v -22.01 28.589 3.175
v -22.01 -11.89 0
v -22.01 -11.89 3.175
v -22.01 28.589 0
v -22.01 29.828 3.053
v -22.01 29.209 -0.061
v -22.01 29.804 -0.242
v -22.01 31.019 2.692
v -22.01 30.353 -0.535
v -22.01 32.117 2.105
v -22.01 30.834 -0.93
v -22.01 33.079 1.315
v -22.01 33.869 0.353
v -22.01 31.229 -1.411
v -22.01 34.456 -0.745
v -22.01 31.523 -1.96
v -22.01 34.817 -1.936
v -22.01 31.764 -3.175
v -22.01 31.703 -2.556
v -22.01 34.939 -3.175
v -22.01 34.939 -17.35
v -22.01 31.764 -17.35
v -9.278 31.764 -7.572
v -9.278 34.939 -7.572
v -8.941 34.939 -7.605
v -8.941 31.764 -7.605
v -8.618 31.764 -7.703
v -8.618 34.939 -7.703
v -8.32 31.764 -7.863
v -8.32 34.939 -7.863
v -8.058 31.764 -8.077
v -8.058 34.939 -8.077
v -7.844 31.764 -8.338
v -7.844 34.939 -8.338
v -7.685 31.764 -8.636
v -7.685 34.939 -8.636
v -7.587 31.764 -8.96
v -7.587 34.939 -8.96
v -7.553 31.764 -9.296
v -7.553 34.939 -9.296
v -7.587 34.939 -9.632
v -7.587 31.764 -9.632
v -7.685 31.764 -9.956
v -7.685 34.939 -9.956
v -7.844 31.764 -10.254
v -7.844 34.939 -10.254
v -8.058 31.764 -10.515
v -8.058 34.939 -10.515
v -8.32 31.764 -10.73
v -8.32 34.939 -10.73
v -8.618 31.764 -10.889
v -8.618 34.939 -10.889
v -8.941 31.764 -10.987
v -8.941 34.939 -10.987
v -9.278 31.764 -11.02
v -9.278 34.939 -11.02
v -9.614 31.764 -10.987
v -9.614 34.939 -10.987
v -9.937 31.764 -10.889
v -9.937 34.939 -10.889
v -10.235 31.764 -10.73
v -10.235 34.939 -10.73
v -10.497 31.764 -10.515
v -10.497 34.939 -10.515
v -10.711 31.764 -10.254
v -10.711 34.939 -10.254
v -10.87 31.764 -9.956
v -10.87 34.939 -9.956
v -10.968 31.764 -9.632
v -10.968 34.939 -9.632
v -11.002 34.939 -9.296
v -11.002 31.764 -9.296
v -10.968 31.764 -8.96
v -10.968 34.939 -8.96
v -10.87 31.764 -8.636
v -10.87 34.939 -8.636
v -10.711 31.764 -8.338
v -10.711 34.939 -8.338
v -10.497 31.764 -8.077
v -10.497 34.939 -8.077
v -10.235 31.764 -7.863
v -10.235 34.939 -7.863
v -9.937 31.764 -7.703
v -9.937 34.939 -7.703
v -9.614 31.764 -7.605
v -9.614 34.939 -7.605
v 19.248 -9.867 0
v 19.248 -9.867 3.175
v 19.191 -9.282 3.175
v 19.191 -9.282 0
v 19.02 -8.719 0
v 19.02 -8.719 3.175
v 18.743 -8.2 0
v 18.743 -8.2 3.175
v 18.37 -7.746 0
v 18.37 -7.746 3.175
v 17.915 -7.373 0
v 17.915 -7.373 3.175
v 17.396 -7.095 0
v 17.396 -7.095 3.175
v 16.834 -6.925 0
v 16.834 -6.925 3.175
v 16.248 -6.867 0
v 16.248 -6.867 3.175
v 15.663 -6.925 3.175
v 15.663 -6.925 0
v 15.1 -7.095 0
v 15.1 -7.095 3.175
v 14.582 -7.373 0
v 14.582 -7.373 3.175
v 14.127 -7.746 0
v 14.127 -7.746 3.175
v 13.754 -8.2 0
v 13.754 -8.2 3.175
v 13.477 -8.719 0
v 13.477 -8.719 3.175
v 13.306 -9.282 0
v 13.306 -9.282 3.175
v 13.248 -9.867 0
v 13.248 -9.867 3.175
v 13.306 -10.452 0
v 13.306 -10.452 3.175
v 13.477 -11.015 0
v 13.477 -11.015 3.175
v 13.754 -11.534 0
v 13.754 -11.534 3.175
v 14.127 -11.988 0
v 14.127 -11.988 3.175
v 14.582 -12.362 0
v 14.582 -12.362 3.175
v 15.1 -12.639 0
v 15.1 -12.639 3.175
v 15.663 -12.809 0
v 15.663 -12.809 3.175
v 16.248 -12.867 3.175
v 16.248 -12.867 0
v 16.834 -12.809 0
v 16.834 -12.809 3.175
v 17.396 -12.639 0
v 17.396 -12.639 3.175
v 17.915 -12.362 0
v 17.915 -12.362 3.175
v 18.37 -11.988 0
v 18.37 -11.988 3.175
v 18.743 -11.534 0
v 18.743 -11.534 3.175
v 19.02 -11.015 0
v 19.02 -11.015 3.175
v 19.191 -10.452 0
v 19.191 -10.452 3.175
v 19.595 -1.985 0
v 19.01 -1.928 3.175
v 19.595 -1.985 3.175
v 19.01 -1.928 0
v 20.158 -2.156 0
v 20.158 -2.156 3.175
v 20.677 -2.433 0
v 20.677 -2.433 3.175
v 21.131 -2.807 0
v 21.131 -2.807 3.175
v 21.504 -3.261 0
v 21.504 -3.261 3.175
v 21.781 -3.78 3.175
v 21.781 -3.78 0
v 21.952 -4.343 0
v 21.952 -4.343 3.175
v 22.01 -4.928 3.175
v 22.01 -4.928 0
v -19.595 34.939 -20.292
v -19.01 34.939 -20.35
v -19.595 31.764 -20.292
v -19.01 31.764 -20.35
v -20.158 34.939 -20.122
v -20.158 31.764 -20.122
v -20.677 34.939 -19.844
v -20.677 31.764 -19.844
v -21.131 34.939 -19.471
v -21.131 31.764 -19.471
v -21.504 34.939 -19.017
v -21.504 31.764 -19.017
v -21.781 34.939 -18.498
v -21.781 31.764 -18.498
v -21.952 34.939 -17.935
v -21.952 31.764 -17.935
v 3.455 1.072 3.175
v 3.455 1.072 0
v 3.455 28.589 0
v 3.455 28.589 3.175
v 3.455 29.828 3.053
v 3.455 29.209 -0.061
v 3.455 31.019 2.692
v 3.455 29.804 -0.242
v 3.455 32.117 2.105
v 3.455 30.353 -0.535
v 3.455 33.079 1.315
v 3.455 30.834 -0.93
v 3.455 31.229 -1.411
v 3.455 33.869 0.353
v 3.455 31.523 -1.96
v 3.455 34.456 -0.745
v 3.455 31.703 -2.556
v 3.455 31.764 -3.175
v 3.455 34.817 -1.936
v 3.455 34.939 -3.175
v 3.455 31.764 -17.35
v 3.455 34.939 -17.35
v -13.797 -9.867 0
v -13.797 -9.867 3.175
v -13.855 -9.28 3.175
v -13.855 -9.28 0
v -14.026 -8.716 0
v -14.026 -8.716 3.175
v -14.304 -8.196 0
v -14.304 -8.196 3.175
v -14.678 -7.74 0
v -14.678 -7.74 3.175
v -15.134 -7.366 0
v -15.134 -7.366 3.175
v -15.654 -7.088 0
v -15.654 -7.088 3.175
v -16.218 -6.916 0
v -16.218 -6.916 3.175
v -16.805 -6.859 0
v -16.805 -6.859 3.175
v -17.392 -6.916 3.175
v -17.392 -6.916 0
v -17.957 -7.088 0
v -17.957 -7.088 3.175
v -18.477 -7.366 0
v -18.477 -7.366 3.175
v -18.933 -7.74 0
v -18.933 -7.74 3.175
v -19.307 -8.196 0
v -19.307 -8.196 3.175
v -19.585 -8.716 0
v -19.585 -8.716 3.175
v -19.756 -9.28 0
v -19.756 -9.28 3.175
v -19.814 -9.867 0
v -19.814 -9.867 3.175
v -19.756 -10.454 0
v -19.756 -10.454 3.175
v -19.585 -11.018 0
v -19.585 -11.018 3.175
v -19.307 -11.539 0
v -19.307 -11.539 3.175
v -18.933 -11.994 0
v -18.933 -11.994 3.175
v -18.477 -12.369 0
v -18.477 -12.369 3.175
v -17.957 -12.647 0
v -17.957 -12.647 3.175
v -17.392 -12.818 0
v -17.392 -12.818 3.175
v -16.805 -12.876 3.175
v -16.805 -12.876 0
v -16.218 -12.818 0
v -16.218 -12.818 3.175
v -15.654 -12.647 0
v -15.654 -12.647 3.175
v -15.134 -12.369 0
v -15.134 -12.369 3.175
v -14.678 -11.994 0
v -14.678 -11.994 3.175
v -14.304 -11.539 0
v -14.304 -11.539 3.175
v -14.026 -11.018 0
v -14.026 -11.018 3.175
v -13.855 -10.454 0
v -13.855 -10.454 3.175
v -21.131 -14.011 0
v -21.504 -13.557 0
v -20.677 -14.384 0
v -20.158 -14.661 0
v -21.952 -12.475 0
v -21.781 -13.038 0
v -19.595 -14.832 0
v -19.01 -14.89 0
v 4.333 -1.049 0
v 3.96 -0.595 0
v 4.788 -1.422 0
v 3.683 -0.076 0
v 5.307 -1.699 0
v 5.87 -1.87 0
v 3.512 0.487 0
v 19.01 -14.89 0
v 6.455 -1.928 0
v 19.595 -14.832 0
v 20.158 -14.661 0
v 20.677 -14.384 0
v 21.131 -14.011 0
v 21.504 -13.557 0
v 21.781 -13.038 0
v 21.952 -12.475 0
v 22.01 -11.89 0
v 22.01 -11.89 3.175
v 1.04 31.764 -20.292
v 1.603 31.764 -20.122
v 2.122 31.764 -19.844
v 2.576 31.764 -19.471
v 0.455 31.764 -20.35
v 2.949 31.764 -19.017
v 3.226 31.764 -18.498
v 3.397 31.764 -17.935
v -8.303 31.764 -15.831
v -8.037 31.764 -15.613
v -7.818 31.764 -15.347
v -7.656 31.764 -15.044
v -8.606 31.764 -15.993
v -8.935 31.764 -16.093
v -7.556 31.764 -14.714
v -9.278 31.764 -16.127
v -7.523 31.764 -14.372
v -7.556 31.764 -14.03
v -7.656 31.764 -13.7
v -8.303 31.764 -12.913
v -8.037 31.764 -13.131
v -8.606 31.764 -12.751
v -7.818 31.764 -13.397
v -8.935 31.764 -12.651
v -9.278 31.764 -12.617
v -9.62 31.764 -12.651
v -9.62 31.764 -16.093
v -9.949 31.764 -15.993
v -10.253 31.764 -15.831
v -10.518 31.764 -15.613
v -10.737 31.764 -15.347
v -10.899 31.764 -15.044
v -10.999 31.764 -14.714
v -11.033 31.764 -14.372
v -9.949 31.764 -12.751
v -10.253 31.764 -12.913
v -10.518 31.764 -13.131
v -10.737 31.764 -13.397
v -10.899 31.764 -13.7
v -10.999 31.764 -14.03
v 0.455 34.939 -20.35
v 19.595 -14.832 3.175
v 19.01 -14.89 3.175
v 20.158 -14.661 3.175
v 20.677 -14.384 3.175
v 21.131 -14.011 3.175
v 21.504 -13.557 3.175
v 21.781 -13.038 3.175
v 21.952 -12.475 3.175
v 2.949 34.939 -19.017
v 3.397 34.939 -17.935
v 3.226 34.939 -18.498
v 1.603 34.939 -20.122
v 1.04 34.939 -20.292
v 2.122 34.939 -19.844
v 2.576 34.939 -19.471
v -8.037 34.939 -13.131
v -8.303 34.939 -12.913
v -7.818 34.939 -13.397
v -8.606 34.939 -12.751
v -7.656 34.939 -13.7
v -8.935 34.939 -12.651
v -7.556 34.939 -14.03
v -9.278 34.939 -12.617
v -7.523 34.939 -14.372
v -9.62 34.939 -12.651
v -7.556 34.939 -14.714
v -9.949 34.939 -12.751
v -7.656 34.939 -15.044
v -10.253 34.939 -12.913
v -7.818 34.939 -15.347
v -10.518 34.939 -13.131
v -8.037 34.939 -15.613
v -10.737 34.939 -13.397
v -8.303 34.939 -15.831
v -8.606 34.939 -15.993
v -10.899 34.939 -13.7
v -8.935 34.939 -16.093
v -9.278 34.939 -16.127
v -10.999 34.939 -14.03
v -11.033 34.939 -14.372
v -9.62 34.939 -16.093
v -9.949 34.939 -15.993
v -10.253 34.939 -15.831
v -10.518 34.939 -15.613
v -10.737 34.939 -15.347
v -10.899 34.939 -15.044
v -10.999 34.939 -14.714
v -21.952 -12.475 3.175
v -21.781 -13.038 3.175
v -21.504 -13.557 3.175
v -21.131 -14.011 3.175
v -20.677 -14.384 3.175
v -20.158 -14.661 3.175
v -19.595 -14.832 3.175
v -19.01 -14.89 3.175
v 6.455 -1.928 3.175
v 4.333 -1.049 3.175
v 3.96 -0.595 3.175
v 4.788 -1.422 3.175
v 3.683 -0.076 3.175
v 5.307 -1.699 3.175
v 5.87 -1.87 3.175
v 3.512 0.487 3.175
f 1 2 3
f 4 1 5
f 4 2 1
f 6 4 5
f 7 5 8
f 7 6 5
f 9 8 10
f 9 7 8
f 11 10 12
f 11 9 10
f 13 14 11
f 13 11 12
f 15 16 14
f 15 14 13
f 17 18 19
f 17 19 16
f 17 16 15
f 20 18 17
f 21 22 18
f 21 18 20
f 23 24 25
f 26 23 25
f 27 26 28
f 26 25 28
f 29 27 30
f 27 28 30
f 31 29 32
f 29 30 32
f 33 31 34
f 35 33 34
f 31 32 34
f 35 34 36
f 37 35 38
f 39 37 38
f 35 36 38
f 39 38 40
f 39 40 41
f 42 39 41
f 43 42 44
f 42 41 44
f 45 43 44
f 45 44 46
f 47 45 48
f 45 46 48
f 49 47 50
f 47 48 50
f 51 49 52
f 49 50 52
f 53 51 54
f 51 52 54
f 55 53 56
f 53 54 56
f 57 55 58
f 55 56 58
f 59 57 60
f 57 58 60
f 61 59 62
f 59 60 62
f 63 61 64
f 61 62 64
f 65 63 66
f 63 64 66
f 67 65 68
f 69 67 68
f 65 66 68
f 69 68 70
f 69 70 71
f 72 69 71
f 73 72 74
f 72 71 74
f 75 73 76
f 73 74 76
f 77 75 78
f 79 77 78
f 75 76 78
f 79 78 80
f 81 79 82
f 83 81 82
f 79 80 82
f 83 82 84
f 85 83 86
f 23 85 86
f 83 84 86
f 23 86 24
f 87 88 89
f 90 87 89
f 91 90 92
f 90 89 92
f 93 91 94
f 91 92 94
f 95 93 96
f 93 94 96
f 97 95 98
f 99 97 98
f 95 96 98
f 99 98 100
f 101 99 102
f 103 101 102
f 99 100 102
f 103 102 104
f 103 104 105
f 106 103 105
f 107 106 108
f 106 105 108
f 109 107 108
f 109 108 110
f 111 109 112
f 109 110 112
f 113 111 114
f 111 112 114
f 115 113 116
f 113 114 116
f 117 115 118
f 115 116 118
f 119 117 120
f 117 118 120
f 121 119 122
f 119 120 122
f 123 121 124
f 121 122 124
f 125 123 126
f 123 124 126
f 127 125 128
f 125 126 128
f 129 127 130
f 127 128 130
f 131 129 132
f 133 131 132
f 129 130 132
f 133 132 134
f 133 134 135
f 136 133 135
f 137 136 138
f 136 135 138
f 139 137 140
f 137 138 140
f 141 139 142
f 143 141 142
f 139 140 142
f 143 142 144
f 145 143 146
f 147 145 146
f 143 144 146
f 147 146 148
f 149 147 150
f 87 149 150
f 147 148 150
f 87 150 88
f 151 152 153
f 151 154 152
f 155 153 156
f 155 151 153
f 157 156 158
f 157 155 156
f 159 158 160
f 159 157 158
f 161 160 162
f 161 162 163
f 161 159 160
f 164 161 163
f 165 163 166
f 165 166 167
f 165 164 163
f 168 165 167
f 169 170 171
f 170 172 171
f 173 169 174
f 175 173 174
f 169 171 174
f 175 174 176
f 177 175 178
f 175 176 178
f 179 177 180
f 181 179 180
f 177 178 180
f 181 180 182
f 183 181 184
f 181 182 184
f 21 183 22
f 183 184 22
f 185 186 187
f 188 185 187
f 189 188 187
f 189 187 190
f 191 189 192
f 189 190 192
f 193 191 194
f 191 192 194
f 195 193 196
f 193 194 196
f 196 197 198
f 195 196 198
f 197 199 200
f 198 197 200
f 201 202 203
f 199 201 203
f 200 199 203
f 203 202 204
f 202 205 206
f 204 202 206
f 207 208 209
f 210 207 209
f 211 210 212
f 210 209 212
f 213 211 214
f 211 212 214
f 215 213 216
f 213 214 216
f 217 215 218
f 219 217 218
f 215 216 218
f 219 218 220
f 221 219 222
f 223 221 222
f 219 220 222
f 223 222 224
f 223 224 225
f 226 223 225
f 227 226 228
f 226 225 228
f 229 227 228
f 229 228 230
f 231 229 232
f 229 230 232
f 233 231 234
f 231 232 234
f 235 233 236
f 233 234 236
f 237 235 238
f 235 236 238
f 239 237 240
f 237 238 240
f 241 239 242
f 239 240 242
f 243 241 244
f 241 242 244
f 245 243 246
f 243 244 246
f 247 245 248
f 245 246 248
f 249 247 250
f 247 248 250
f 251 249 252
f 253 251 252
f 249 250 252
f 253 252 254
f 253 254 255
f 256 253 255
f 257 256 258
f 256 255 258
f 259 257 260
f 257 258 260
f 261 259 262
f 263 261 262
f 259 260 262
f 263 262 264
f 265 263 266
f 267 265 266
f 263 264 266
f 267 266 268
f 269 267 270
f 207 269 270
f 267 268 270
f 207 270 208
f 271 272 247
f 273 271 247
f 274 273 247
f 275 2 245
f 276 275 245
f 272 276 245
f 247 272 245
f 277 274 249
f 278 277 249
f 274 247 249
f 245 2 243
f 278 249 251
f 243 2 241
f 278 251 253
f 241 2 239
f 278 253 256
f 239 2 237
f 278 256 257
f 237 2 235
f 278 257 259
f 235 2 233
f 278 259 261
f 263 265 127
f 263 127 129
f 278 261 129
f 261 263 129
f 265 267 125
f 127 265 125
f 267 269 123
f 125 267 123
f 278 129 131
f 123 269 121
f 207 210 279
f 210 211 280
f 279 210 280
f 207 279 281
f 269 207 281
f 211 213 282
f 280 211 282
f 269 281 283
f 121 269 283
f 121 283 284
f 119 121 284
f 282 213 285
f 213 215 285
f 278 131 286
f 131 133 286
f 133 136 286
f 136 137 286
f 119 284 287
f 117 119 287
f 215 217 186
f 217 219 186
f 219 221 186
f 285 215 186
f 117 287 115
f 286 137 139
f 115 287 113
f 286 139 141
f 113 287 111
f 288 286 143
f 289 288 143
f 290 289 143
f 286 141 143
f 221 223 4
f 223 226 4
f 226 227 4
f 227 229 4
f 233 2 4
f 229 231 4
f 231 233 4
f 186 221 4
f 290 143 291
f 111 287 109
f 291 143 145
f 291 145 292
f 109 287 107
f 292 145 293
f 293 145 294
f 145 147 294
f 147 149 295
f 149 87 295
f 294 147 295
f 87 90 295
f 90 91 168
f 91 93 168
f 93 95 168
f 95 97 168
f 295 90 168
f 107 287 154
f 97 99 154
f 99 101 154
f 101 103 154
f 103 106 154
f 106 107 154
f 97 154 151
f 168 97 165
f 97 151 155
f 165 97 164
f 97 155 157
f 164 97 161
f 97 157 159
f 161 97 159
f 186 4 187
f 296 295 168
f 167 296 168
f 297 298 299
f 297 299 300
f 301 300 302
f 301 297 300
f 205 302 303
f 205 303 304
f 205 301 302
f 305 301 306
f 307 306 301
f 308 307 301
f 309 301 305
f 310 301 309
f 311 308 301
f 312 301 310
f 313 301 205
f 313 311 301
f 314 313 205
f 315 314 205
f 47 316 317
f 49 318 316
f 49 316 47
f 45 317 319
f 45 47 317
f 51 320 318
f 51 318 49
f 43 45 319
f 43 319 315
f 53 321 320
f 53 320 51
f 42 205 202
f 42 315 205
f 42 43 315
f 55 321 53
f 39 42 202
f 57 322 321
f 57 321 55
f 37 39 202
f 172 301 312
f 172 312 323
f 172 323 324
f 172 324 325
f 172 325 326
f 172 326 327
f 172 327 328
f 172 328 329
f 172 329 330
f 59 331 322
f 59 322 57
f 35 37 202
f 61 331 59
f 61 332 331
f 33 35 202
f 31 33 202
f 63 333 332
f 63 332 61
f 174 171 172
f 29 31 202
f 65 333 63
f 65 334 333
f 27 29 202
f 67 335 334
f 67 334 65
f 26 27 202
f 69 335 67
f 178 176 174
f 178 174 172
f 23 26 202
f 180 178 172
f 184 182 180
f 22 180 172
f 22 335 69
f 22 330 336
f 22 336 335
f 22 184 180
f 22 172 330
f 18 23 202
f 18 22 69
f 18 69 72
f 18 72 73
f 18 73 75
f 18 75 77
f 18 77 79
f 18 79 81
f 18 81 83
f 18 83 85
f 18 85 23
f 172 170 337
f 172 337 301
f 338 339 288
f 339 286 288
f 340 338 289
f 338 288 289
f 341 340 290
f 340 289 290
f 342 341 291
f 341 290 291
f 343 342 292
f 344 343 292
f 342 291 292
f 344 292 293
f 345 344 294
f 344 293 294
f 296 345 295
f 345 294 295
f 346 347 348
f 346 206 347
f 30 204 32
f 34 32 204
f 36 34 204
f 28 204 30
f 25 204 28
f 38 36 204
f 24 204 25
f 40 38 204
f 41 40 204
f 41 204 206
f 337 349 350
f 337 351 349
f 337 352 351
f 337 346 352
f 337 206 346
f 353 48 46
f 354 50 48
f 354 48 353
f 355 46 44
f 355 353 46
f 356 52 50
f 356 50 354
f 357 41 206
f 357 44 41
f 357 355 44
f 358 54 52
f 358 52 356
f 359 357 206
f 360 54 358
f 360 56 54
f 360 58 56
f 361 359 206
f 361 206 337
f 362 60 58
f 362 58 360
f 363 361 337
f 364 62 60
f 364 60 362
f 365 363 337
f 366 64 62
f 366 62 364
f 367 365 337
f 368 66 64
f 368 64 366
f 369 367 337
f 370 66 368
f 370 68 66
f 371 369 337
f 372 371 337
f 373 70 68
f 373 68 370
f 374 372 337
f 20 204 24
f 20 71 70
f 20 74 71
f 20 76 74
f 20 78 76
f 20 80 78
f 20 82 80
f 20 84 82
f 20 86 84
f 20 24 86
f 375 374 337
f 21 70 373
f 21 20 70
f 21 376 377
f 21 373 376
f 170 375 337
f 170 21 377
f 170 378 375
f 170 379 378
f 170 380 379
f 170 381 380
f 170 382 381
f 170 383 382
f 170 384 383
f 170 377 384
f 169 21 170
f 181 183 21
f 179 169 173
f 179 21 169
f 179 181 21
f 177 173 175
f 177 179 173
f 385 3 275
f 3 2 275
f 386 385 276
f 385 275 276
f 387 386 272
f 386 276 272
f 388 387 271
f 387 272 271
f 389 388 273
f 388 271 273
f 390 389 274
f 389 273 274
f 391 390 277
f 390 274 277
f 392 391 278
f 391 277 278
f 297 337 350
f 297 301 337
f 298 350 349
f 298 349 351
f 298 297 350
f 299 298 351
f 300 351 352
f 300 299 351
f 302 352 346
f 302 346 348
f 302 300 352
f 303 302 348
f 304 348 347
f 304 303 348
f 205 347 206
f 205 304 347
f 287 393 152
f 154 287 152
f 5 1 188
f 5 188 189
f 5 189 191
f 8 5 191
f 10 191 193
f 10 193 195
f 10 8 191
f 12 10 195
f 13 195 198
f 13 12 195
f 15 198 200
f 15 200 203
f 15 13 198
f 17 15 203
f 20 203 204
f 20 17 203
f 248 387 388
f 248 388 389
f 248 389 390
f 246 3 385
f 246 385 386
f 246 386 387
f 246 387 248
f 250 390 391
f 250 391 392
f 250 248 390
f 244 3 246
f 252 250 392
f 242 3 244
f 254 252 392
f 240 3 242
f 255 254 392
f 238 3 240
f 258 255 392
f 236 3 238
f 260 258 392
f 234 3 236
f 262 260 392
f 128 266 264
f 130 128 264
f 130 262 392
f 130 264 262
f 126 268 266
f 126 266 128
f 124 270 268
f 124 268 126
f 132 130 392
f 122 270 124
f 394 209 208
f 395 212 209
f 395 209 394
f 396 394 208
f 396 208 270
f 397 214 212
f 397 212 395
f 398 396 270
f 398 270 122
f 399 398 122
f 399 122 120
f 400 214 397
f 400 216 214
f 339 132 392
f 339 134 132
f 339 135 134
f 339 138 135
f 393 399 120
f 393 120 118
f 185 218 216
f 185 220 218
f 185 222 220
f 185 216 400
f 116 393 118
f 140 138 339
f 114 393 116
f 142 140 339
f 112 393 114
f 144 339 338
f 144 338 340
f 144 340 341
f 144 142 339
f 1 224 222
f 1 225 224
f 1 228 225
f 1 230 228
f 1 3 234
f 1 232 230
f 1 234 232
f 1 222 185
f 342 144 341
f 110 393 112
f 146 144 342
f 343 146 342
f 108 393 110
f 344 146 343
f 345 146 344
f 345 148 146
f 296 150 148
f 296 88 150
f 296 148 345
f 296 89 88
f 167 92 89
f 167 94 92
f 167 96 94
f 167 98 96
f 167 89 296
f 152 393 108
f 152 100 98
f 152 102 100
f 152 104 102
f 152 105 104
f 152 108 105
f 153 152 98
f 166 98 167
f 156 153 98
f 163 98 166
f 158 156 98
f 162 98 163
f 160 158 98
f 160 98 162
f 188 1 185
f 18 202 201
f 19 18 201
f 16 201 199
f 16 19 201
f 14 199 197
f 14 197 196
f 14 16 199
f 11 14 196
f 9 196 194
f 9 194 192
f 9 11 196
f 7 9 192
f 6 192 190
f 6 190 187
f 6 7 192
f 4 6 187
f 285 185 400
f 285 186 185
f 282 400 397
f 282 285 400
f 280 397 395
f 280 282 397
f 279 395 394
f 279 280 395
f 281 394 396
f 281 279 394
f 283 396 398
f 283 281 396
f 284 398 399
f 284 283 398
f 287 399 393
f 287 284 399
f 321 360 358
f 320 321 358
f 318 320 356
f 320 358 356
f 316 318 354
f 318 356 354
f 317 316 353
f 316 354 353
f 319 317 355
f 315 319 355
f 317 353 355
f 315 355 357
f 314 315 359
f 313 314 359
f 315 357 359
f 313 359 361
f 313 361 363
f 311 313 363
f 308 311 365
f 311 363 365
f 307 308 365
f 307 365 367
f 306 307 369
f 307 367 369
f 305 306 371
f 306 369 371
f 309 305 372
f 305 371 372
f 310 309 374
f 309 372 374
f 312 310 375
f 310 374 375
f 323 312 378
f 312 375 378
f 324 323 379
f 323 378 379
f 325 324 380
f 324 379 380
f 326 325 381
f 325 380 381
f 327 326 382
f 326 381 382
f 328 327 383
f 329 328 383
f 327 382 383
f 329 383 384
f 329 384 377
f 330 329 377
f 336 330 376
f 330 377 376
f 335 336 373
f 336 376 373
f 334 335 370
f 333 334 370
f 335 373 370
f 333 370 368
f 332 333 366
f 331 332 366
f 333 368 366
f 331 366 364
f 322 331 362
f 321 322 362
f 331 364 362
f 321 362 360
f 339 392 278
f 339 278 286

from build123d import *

# Parameters (mm, degrees)
SKETCH1_W                    = 44.01968481
SKETCH1_H                    = 69.878571894
BOSS_EXTRUDE1_DEPTH          = 3.175
SKETCH3_W                    = 18.555037993
SKETCH3_H                    = 36.867111451
CUT_EXTRUDE1_DEPTH           = 3.175
EDGE_FLANGE1_STRIP_W         = 19.05
EDGE_FLANGE1_STRIP_H         = 3.175
EDGE_FLANGE1_STRIP_CUT_DEPTH = 25.464646817
EDGE_FLANGE1_DEPTH           = 25.464646817
SKETCH22_W                   = 44.01968481
SKETCH22_H                   = 20.04943399
CUT_EXTRUDE2_DEPTH           = 3.175
FILLET1_R                    = 3
SKETCH23_R                   = 3.008539127
SKETCH23_R_2                 = 3
CUT_EXTRUDE3_DEPTH           = 3.175
SKETCH24_R                   = 1.724090174
SKETCH24_R_2                 = 1.754985839
CUT_EXTRUDE4_DEPTH           = 3.175


# Sheet-metal steps are written as plain solids
with BuildPart() as part:
    # Sketch1 → Boss-Extrude1 (new body)
    with BuildSketch(Plane.XY):
        Rectangle(SKETCH1_W, SKETCH1_H)
    extrude(amount=BOSS_EXTRUDE1_DEPTH)

    # Sketch3 → Cut-Extrude1 (cut)
    with BuildSketch(Plane.XY.offset(3.175)):
        with Locations((12.732323409, 16.505730222)):
            Rectangle(SKETCH3_W, SKETCH3_H)
    extrude(amount=-CUT_EXTRUDE1_DEPTH, mode=Mode.SUBTRACT)

    # Edge-Flange1 strip (across the edge) → Edge-Flange1 strip cut (cut)
    with BuildSketch(Plane(origin=(-22.009842405, 34.939285947, 0), x_dir=(0, -1, 0), z_dir=(1, 0, 0))):
        with Locations((-3.175, -1.5875)):
            Rectangle(EDGE_FLANGE1_STRIP_W, EDGE_FLANGE1_STRIP_H)
    extrude(amount=EDGE_FLANGE1_STRIP_CUT_DEPTH, mode=Mode.SUBTRACT)

    # Edge-Flange1 section (across the edge) → Edge-Flange1 (add)
    with BuildSketch(Plane(origin=(-22.009842405, 34.939285947, 0), x_dir=(0, -1, 0), z_dir=(1, 0, 0))):
        with BuildLine():
            Line((0, 3.175), (0, 20.35))
            Line((0, 20.35), (3.175, 20.35))
            Line((3.175, 20.35), (3.175, 3.175))
            ThreePointArc((3.175, 3.175), (4.10493597, 0.92993597), (6.35, 0))
            Line((6.35, 0), (6.35, -3.175))
            ThreePointArc((6.35, -3.175), (1.859871939, -1.315128061), (0, 3.175))
        make_face()
    extrude(amount=EDGE_FLANGE1_DEPTH)

    # Sketch22 → Cut-Extrude2 (cut)
    with BuildSketch(Plane.XY.offset(3.175)):
        with Locations((0, -24.914568952)):
            Rectangle(SKETCH22_W, SKETCH22_H)
    extrude(amount=-CUT_EXTRUDE2_DEPTH, mode=Mode.SUBTRACT)

    # Fillet1
    fillet1_edges = [part.edges().sort_by_distance(p)[0] for p in [
        (22.009842405, -1.927825504, 1.5875),
        (3.454804412, -1.927825504, 1.5875),
        (-22.009842405, 33.351785947, -20.35),
        (3.454804412, 33.351785947, -20.35),
        (-22.009842405, -14.889851957, 1.5875),
        (22.009842405, -14.889851957, 1.5875),
    ]]
    fillet(fillet1_edges, radius=FILLET1_R)

    # Sketch23 → Cut-Extrude3 (cut)
    with BuildSketch(Plane.XY.offset(3.175)):
        with Locations((-16.805425884, -9.867122138)):
            Circle(SKETCH23_R)
        with Locations((16.248443226, -9.867122138)):
            Circle(SKETCH23_R_2)
    extrude(amount=-CUT_EXTRUDE3_DEPTH, mode=Mode.SUBTRACT)

    # Sketch24 → Cut-Extrude4 (cut)
    with BuildSketch(Plane(origin=(0, 34.939285947, 0), x_dir=(1, 0, 0), z_dir=(0, 1, 0))):
        with Locations(Location((-9.277518997, 9.296029356, 0), (0, 0, 270))):
            Circle(SKETCH24_R)
        with Locations(Location((-9.277518997, 14.371964171, 0), (0, 0, 270))):
            Circle(SKETCH24_R_2)
    extrude(amount=-CUT_EXTRUDE4_DEPTH, mode=Mode.SUBTRACT)


solid = part.part
